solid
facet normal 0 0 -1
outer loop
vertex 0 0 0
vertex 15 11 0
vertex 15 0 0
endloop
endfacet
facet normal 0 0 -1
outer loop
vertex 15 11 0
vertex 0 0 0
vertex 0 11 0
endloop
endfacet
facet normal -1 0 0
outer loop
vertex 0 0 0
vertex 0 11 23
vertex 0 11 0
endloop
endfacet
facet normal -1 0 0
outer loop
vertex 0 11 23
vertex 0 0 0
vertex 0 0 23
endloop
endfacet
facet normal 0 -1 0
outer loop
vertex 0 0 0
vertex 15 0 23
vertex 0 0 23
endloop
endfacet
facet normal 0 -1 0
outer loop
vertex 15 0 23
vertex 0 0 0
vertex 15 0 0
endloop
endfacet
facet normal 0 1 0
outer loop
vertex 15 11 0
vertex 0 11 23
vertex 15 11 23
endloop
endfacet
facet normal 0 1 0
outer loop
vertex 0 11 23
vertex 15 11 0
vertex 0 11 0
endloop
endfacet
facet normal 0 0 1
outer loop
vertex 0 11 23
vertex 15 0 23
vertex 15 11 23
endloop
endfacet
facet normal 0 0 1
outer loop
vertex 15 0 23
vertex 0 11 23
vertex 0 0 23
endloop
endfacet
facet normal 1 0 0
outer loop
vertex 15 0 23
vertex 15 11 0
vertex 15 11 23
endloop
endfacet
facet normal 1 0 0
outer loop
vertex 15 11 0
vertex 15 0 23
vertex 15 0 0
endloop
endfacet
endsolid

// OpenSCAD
cube([0,0,22]);
cube([0,1,22]);
cube([0,2,22]);
cube([0,3,22]);
cube([0,4,22]);
cube([0,5,21]);
cube([0,6,21]);
cube([0,7,20]);
cube([0,8,20]);
cube([0,9,20]);
cube([0,10,20]);
cube([0,11,20]);
cube([1,0,22]);
cube([1,1,22]);
cube([1,2,22]);
cube([1,3,22]);
cube([1,4,21]);
cube([1,5,19]);
cube([1,6,19]);
cube([1,7,17]);
cube([1,8,18]);
cube([1,9,19]);
cube([1,10,20]);
cube([1,11,20]);
cube([2,0,22]);
cube([2,1,22]);
cube([2,2,22]);
cube([2,3,20]);
cube([2,4,21]);
cube([2,5,20]);
cube([2,6,10]);
cube([2,7,19]);
cube([2,8,19]);
cube([2,9,16]);
cube([2,10,17]);
cube([2,11,20]);
cube([3,0,22]);
cube([3,1,22]);
cube([3,2,20]);
cube([3,3,14]);
cube([3,4,21]);
cube([3,5,21]);
cube([3,6,20]);
cube([3,7,20]);
cube([3,8,9]);
cube([3,9,16]);
cube([3,10,19]);
cube([3,11,18]);
cube([4,0,22]);
cube([4,1,20]);
cube([4,2,21]);
cube([4,3,21]);
cube([4,4,21]);
cube([4,5,21]);
cube([4,6,21]);
cube([4,7,12]);
cube([4,8,19]);
cube([4,9,19]);
cube([4,10,19]);
cube([4,11,17]);
cube([5,0,21]);
cube([5,1,15]);
cube([5,2,21]);
cube([5,3,21]);
cube([5,4,21]);
cube([5,5,21]);
cube([5,6,21]);
cube([5,7,21]);
cube([5,8,21]);
cube([5,9,20]);
cube([5,10,11]);
cube([5,11,20]);
cube([6,0,21]);
cube([6,1,22]);
cube([6,2,22]);
cube([6,3,22]);
cube([6,4,21]);
cube([6,5,21]);
cube([6,6,20]);
cube([6,7,20]);
cube([6,8,20]);
cube([6,9,21]);
cube([6,10,11]);
cube([6,11,20]);
cube([7,0,22]);
cube([7,1,21]);
cube([7,2,21]);
cube([7,3,21]);
cube([7,4,21]);
cube([7,5,21]);
cube([7,6,9]);
cube([7,7,19]);
cube([7,8,21]);
cube([7,9,21]);
cube([7,10,21]);
cube([7,11,11]);
cube([8,0,21]);
cube([8,1,15]);
cube([8,2,21]);
cube([8,3,22]);
cube([8,4,21]);
cube([8,5,21]);
cube([8,6,21]);
cube([8,7,21]);
cube([8,8,21]);
cube([8,9,21]);
cube([8,10,20]);
cube([8,11,20]);
cube([9,0,22]);
cube([9,1,22]);
cube([9,2,22]);
cube([9,3,21]);
cube([9,4,22]);
cube([9,5,21]);
cube([9,6,22]);
cube([9,7,21]);
cube([9,8,21]);
cube([9,9,21]);
cube([9,10,21]);
cube([9,11,21]);
cube([10,0,23]);
cube([10,1,16]);
cube([10,2,22]);
cube([10,3,22]);
cube([10,4,22]);
cube([10,5,22]);
cube([10,6,22]);
cube([10,7,21]);
cube([10,8,21]);
cube([10,9,21]);
cube([10,10,14]);
cube([10,11,20]);
cube([11,0,23]);
cube([11,1,22]);
cube([11,2,22]);
cube([11,3,22]);
cube([11,4,22]);
cube([11,5,21]);
cube([11,6,21]);
cube([11,7,21]);
cube([11,8,21]);
cube([11,9,20]);
cube([11,10,21]);
cube([11,11,22]);
cube([12,0,23]);
cube([12,1,23]);
cube([12,2,21]);
cube([12,3,16]);
cube([12,4,21]);
cube([12,5,21]);
cube([12,6,21]);
cube([12,7,21]);
cube([12,8,11]);
cube([12,9,21]);
cube([12,10,22]);
cube([12,11,22]);
cube([13,0,23]);
cube([13,1,23]);
cube([13,2,23]);
cube([13,3,23]);
cube([13,4,22]);
cube([13,5,22]);
cube([13,6,21]);
cube([13,7,22]);
cube([13,8,22]);
cube([13,9,23]);
cube([13,10,22]);
cube([13,11,23]);
cube([14,0,23]);
cube([14,1,23]);
cube([14,2,23]);
cube([14,3,23]);
cube([14,4,23]);
cube([14,5,23]);
cube([14,6,23]);
cube([14,7,23]);
cube([14,8,23]);
cube([14,9,23]);
cube([14,10,23]);
cube([14,11,23]);
cube([15,0,23]);
cube([15,1,23]);
cube([15,2,23]);
cube([15,3,23]);
cube([15,4,23]);
cube([15,5,23]);
cube([15,6,23]);
cube([15,7,23]);
cube([15,8,23]);
cube([15,9,23]);
cube([15,10,23]);
cube([15,11,23]);
